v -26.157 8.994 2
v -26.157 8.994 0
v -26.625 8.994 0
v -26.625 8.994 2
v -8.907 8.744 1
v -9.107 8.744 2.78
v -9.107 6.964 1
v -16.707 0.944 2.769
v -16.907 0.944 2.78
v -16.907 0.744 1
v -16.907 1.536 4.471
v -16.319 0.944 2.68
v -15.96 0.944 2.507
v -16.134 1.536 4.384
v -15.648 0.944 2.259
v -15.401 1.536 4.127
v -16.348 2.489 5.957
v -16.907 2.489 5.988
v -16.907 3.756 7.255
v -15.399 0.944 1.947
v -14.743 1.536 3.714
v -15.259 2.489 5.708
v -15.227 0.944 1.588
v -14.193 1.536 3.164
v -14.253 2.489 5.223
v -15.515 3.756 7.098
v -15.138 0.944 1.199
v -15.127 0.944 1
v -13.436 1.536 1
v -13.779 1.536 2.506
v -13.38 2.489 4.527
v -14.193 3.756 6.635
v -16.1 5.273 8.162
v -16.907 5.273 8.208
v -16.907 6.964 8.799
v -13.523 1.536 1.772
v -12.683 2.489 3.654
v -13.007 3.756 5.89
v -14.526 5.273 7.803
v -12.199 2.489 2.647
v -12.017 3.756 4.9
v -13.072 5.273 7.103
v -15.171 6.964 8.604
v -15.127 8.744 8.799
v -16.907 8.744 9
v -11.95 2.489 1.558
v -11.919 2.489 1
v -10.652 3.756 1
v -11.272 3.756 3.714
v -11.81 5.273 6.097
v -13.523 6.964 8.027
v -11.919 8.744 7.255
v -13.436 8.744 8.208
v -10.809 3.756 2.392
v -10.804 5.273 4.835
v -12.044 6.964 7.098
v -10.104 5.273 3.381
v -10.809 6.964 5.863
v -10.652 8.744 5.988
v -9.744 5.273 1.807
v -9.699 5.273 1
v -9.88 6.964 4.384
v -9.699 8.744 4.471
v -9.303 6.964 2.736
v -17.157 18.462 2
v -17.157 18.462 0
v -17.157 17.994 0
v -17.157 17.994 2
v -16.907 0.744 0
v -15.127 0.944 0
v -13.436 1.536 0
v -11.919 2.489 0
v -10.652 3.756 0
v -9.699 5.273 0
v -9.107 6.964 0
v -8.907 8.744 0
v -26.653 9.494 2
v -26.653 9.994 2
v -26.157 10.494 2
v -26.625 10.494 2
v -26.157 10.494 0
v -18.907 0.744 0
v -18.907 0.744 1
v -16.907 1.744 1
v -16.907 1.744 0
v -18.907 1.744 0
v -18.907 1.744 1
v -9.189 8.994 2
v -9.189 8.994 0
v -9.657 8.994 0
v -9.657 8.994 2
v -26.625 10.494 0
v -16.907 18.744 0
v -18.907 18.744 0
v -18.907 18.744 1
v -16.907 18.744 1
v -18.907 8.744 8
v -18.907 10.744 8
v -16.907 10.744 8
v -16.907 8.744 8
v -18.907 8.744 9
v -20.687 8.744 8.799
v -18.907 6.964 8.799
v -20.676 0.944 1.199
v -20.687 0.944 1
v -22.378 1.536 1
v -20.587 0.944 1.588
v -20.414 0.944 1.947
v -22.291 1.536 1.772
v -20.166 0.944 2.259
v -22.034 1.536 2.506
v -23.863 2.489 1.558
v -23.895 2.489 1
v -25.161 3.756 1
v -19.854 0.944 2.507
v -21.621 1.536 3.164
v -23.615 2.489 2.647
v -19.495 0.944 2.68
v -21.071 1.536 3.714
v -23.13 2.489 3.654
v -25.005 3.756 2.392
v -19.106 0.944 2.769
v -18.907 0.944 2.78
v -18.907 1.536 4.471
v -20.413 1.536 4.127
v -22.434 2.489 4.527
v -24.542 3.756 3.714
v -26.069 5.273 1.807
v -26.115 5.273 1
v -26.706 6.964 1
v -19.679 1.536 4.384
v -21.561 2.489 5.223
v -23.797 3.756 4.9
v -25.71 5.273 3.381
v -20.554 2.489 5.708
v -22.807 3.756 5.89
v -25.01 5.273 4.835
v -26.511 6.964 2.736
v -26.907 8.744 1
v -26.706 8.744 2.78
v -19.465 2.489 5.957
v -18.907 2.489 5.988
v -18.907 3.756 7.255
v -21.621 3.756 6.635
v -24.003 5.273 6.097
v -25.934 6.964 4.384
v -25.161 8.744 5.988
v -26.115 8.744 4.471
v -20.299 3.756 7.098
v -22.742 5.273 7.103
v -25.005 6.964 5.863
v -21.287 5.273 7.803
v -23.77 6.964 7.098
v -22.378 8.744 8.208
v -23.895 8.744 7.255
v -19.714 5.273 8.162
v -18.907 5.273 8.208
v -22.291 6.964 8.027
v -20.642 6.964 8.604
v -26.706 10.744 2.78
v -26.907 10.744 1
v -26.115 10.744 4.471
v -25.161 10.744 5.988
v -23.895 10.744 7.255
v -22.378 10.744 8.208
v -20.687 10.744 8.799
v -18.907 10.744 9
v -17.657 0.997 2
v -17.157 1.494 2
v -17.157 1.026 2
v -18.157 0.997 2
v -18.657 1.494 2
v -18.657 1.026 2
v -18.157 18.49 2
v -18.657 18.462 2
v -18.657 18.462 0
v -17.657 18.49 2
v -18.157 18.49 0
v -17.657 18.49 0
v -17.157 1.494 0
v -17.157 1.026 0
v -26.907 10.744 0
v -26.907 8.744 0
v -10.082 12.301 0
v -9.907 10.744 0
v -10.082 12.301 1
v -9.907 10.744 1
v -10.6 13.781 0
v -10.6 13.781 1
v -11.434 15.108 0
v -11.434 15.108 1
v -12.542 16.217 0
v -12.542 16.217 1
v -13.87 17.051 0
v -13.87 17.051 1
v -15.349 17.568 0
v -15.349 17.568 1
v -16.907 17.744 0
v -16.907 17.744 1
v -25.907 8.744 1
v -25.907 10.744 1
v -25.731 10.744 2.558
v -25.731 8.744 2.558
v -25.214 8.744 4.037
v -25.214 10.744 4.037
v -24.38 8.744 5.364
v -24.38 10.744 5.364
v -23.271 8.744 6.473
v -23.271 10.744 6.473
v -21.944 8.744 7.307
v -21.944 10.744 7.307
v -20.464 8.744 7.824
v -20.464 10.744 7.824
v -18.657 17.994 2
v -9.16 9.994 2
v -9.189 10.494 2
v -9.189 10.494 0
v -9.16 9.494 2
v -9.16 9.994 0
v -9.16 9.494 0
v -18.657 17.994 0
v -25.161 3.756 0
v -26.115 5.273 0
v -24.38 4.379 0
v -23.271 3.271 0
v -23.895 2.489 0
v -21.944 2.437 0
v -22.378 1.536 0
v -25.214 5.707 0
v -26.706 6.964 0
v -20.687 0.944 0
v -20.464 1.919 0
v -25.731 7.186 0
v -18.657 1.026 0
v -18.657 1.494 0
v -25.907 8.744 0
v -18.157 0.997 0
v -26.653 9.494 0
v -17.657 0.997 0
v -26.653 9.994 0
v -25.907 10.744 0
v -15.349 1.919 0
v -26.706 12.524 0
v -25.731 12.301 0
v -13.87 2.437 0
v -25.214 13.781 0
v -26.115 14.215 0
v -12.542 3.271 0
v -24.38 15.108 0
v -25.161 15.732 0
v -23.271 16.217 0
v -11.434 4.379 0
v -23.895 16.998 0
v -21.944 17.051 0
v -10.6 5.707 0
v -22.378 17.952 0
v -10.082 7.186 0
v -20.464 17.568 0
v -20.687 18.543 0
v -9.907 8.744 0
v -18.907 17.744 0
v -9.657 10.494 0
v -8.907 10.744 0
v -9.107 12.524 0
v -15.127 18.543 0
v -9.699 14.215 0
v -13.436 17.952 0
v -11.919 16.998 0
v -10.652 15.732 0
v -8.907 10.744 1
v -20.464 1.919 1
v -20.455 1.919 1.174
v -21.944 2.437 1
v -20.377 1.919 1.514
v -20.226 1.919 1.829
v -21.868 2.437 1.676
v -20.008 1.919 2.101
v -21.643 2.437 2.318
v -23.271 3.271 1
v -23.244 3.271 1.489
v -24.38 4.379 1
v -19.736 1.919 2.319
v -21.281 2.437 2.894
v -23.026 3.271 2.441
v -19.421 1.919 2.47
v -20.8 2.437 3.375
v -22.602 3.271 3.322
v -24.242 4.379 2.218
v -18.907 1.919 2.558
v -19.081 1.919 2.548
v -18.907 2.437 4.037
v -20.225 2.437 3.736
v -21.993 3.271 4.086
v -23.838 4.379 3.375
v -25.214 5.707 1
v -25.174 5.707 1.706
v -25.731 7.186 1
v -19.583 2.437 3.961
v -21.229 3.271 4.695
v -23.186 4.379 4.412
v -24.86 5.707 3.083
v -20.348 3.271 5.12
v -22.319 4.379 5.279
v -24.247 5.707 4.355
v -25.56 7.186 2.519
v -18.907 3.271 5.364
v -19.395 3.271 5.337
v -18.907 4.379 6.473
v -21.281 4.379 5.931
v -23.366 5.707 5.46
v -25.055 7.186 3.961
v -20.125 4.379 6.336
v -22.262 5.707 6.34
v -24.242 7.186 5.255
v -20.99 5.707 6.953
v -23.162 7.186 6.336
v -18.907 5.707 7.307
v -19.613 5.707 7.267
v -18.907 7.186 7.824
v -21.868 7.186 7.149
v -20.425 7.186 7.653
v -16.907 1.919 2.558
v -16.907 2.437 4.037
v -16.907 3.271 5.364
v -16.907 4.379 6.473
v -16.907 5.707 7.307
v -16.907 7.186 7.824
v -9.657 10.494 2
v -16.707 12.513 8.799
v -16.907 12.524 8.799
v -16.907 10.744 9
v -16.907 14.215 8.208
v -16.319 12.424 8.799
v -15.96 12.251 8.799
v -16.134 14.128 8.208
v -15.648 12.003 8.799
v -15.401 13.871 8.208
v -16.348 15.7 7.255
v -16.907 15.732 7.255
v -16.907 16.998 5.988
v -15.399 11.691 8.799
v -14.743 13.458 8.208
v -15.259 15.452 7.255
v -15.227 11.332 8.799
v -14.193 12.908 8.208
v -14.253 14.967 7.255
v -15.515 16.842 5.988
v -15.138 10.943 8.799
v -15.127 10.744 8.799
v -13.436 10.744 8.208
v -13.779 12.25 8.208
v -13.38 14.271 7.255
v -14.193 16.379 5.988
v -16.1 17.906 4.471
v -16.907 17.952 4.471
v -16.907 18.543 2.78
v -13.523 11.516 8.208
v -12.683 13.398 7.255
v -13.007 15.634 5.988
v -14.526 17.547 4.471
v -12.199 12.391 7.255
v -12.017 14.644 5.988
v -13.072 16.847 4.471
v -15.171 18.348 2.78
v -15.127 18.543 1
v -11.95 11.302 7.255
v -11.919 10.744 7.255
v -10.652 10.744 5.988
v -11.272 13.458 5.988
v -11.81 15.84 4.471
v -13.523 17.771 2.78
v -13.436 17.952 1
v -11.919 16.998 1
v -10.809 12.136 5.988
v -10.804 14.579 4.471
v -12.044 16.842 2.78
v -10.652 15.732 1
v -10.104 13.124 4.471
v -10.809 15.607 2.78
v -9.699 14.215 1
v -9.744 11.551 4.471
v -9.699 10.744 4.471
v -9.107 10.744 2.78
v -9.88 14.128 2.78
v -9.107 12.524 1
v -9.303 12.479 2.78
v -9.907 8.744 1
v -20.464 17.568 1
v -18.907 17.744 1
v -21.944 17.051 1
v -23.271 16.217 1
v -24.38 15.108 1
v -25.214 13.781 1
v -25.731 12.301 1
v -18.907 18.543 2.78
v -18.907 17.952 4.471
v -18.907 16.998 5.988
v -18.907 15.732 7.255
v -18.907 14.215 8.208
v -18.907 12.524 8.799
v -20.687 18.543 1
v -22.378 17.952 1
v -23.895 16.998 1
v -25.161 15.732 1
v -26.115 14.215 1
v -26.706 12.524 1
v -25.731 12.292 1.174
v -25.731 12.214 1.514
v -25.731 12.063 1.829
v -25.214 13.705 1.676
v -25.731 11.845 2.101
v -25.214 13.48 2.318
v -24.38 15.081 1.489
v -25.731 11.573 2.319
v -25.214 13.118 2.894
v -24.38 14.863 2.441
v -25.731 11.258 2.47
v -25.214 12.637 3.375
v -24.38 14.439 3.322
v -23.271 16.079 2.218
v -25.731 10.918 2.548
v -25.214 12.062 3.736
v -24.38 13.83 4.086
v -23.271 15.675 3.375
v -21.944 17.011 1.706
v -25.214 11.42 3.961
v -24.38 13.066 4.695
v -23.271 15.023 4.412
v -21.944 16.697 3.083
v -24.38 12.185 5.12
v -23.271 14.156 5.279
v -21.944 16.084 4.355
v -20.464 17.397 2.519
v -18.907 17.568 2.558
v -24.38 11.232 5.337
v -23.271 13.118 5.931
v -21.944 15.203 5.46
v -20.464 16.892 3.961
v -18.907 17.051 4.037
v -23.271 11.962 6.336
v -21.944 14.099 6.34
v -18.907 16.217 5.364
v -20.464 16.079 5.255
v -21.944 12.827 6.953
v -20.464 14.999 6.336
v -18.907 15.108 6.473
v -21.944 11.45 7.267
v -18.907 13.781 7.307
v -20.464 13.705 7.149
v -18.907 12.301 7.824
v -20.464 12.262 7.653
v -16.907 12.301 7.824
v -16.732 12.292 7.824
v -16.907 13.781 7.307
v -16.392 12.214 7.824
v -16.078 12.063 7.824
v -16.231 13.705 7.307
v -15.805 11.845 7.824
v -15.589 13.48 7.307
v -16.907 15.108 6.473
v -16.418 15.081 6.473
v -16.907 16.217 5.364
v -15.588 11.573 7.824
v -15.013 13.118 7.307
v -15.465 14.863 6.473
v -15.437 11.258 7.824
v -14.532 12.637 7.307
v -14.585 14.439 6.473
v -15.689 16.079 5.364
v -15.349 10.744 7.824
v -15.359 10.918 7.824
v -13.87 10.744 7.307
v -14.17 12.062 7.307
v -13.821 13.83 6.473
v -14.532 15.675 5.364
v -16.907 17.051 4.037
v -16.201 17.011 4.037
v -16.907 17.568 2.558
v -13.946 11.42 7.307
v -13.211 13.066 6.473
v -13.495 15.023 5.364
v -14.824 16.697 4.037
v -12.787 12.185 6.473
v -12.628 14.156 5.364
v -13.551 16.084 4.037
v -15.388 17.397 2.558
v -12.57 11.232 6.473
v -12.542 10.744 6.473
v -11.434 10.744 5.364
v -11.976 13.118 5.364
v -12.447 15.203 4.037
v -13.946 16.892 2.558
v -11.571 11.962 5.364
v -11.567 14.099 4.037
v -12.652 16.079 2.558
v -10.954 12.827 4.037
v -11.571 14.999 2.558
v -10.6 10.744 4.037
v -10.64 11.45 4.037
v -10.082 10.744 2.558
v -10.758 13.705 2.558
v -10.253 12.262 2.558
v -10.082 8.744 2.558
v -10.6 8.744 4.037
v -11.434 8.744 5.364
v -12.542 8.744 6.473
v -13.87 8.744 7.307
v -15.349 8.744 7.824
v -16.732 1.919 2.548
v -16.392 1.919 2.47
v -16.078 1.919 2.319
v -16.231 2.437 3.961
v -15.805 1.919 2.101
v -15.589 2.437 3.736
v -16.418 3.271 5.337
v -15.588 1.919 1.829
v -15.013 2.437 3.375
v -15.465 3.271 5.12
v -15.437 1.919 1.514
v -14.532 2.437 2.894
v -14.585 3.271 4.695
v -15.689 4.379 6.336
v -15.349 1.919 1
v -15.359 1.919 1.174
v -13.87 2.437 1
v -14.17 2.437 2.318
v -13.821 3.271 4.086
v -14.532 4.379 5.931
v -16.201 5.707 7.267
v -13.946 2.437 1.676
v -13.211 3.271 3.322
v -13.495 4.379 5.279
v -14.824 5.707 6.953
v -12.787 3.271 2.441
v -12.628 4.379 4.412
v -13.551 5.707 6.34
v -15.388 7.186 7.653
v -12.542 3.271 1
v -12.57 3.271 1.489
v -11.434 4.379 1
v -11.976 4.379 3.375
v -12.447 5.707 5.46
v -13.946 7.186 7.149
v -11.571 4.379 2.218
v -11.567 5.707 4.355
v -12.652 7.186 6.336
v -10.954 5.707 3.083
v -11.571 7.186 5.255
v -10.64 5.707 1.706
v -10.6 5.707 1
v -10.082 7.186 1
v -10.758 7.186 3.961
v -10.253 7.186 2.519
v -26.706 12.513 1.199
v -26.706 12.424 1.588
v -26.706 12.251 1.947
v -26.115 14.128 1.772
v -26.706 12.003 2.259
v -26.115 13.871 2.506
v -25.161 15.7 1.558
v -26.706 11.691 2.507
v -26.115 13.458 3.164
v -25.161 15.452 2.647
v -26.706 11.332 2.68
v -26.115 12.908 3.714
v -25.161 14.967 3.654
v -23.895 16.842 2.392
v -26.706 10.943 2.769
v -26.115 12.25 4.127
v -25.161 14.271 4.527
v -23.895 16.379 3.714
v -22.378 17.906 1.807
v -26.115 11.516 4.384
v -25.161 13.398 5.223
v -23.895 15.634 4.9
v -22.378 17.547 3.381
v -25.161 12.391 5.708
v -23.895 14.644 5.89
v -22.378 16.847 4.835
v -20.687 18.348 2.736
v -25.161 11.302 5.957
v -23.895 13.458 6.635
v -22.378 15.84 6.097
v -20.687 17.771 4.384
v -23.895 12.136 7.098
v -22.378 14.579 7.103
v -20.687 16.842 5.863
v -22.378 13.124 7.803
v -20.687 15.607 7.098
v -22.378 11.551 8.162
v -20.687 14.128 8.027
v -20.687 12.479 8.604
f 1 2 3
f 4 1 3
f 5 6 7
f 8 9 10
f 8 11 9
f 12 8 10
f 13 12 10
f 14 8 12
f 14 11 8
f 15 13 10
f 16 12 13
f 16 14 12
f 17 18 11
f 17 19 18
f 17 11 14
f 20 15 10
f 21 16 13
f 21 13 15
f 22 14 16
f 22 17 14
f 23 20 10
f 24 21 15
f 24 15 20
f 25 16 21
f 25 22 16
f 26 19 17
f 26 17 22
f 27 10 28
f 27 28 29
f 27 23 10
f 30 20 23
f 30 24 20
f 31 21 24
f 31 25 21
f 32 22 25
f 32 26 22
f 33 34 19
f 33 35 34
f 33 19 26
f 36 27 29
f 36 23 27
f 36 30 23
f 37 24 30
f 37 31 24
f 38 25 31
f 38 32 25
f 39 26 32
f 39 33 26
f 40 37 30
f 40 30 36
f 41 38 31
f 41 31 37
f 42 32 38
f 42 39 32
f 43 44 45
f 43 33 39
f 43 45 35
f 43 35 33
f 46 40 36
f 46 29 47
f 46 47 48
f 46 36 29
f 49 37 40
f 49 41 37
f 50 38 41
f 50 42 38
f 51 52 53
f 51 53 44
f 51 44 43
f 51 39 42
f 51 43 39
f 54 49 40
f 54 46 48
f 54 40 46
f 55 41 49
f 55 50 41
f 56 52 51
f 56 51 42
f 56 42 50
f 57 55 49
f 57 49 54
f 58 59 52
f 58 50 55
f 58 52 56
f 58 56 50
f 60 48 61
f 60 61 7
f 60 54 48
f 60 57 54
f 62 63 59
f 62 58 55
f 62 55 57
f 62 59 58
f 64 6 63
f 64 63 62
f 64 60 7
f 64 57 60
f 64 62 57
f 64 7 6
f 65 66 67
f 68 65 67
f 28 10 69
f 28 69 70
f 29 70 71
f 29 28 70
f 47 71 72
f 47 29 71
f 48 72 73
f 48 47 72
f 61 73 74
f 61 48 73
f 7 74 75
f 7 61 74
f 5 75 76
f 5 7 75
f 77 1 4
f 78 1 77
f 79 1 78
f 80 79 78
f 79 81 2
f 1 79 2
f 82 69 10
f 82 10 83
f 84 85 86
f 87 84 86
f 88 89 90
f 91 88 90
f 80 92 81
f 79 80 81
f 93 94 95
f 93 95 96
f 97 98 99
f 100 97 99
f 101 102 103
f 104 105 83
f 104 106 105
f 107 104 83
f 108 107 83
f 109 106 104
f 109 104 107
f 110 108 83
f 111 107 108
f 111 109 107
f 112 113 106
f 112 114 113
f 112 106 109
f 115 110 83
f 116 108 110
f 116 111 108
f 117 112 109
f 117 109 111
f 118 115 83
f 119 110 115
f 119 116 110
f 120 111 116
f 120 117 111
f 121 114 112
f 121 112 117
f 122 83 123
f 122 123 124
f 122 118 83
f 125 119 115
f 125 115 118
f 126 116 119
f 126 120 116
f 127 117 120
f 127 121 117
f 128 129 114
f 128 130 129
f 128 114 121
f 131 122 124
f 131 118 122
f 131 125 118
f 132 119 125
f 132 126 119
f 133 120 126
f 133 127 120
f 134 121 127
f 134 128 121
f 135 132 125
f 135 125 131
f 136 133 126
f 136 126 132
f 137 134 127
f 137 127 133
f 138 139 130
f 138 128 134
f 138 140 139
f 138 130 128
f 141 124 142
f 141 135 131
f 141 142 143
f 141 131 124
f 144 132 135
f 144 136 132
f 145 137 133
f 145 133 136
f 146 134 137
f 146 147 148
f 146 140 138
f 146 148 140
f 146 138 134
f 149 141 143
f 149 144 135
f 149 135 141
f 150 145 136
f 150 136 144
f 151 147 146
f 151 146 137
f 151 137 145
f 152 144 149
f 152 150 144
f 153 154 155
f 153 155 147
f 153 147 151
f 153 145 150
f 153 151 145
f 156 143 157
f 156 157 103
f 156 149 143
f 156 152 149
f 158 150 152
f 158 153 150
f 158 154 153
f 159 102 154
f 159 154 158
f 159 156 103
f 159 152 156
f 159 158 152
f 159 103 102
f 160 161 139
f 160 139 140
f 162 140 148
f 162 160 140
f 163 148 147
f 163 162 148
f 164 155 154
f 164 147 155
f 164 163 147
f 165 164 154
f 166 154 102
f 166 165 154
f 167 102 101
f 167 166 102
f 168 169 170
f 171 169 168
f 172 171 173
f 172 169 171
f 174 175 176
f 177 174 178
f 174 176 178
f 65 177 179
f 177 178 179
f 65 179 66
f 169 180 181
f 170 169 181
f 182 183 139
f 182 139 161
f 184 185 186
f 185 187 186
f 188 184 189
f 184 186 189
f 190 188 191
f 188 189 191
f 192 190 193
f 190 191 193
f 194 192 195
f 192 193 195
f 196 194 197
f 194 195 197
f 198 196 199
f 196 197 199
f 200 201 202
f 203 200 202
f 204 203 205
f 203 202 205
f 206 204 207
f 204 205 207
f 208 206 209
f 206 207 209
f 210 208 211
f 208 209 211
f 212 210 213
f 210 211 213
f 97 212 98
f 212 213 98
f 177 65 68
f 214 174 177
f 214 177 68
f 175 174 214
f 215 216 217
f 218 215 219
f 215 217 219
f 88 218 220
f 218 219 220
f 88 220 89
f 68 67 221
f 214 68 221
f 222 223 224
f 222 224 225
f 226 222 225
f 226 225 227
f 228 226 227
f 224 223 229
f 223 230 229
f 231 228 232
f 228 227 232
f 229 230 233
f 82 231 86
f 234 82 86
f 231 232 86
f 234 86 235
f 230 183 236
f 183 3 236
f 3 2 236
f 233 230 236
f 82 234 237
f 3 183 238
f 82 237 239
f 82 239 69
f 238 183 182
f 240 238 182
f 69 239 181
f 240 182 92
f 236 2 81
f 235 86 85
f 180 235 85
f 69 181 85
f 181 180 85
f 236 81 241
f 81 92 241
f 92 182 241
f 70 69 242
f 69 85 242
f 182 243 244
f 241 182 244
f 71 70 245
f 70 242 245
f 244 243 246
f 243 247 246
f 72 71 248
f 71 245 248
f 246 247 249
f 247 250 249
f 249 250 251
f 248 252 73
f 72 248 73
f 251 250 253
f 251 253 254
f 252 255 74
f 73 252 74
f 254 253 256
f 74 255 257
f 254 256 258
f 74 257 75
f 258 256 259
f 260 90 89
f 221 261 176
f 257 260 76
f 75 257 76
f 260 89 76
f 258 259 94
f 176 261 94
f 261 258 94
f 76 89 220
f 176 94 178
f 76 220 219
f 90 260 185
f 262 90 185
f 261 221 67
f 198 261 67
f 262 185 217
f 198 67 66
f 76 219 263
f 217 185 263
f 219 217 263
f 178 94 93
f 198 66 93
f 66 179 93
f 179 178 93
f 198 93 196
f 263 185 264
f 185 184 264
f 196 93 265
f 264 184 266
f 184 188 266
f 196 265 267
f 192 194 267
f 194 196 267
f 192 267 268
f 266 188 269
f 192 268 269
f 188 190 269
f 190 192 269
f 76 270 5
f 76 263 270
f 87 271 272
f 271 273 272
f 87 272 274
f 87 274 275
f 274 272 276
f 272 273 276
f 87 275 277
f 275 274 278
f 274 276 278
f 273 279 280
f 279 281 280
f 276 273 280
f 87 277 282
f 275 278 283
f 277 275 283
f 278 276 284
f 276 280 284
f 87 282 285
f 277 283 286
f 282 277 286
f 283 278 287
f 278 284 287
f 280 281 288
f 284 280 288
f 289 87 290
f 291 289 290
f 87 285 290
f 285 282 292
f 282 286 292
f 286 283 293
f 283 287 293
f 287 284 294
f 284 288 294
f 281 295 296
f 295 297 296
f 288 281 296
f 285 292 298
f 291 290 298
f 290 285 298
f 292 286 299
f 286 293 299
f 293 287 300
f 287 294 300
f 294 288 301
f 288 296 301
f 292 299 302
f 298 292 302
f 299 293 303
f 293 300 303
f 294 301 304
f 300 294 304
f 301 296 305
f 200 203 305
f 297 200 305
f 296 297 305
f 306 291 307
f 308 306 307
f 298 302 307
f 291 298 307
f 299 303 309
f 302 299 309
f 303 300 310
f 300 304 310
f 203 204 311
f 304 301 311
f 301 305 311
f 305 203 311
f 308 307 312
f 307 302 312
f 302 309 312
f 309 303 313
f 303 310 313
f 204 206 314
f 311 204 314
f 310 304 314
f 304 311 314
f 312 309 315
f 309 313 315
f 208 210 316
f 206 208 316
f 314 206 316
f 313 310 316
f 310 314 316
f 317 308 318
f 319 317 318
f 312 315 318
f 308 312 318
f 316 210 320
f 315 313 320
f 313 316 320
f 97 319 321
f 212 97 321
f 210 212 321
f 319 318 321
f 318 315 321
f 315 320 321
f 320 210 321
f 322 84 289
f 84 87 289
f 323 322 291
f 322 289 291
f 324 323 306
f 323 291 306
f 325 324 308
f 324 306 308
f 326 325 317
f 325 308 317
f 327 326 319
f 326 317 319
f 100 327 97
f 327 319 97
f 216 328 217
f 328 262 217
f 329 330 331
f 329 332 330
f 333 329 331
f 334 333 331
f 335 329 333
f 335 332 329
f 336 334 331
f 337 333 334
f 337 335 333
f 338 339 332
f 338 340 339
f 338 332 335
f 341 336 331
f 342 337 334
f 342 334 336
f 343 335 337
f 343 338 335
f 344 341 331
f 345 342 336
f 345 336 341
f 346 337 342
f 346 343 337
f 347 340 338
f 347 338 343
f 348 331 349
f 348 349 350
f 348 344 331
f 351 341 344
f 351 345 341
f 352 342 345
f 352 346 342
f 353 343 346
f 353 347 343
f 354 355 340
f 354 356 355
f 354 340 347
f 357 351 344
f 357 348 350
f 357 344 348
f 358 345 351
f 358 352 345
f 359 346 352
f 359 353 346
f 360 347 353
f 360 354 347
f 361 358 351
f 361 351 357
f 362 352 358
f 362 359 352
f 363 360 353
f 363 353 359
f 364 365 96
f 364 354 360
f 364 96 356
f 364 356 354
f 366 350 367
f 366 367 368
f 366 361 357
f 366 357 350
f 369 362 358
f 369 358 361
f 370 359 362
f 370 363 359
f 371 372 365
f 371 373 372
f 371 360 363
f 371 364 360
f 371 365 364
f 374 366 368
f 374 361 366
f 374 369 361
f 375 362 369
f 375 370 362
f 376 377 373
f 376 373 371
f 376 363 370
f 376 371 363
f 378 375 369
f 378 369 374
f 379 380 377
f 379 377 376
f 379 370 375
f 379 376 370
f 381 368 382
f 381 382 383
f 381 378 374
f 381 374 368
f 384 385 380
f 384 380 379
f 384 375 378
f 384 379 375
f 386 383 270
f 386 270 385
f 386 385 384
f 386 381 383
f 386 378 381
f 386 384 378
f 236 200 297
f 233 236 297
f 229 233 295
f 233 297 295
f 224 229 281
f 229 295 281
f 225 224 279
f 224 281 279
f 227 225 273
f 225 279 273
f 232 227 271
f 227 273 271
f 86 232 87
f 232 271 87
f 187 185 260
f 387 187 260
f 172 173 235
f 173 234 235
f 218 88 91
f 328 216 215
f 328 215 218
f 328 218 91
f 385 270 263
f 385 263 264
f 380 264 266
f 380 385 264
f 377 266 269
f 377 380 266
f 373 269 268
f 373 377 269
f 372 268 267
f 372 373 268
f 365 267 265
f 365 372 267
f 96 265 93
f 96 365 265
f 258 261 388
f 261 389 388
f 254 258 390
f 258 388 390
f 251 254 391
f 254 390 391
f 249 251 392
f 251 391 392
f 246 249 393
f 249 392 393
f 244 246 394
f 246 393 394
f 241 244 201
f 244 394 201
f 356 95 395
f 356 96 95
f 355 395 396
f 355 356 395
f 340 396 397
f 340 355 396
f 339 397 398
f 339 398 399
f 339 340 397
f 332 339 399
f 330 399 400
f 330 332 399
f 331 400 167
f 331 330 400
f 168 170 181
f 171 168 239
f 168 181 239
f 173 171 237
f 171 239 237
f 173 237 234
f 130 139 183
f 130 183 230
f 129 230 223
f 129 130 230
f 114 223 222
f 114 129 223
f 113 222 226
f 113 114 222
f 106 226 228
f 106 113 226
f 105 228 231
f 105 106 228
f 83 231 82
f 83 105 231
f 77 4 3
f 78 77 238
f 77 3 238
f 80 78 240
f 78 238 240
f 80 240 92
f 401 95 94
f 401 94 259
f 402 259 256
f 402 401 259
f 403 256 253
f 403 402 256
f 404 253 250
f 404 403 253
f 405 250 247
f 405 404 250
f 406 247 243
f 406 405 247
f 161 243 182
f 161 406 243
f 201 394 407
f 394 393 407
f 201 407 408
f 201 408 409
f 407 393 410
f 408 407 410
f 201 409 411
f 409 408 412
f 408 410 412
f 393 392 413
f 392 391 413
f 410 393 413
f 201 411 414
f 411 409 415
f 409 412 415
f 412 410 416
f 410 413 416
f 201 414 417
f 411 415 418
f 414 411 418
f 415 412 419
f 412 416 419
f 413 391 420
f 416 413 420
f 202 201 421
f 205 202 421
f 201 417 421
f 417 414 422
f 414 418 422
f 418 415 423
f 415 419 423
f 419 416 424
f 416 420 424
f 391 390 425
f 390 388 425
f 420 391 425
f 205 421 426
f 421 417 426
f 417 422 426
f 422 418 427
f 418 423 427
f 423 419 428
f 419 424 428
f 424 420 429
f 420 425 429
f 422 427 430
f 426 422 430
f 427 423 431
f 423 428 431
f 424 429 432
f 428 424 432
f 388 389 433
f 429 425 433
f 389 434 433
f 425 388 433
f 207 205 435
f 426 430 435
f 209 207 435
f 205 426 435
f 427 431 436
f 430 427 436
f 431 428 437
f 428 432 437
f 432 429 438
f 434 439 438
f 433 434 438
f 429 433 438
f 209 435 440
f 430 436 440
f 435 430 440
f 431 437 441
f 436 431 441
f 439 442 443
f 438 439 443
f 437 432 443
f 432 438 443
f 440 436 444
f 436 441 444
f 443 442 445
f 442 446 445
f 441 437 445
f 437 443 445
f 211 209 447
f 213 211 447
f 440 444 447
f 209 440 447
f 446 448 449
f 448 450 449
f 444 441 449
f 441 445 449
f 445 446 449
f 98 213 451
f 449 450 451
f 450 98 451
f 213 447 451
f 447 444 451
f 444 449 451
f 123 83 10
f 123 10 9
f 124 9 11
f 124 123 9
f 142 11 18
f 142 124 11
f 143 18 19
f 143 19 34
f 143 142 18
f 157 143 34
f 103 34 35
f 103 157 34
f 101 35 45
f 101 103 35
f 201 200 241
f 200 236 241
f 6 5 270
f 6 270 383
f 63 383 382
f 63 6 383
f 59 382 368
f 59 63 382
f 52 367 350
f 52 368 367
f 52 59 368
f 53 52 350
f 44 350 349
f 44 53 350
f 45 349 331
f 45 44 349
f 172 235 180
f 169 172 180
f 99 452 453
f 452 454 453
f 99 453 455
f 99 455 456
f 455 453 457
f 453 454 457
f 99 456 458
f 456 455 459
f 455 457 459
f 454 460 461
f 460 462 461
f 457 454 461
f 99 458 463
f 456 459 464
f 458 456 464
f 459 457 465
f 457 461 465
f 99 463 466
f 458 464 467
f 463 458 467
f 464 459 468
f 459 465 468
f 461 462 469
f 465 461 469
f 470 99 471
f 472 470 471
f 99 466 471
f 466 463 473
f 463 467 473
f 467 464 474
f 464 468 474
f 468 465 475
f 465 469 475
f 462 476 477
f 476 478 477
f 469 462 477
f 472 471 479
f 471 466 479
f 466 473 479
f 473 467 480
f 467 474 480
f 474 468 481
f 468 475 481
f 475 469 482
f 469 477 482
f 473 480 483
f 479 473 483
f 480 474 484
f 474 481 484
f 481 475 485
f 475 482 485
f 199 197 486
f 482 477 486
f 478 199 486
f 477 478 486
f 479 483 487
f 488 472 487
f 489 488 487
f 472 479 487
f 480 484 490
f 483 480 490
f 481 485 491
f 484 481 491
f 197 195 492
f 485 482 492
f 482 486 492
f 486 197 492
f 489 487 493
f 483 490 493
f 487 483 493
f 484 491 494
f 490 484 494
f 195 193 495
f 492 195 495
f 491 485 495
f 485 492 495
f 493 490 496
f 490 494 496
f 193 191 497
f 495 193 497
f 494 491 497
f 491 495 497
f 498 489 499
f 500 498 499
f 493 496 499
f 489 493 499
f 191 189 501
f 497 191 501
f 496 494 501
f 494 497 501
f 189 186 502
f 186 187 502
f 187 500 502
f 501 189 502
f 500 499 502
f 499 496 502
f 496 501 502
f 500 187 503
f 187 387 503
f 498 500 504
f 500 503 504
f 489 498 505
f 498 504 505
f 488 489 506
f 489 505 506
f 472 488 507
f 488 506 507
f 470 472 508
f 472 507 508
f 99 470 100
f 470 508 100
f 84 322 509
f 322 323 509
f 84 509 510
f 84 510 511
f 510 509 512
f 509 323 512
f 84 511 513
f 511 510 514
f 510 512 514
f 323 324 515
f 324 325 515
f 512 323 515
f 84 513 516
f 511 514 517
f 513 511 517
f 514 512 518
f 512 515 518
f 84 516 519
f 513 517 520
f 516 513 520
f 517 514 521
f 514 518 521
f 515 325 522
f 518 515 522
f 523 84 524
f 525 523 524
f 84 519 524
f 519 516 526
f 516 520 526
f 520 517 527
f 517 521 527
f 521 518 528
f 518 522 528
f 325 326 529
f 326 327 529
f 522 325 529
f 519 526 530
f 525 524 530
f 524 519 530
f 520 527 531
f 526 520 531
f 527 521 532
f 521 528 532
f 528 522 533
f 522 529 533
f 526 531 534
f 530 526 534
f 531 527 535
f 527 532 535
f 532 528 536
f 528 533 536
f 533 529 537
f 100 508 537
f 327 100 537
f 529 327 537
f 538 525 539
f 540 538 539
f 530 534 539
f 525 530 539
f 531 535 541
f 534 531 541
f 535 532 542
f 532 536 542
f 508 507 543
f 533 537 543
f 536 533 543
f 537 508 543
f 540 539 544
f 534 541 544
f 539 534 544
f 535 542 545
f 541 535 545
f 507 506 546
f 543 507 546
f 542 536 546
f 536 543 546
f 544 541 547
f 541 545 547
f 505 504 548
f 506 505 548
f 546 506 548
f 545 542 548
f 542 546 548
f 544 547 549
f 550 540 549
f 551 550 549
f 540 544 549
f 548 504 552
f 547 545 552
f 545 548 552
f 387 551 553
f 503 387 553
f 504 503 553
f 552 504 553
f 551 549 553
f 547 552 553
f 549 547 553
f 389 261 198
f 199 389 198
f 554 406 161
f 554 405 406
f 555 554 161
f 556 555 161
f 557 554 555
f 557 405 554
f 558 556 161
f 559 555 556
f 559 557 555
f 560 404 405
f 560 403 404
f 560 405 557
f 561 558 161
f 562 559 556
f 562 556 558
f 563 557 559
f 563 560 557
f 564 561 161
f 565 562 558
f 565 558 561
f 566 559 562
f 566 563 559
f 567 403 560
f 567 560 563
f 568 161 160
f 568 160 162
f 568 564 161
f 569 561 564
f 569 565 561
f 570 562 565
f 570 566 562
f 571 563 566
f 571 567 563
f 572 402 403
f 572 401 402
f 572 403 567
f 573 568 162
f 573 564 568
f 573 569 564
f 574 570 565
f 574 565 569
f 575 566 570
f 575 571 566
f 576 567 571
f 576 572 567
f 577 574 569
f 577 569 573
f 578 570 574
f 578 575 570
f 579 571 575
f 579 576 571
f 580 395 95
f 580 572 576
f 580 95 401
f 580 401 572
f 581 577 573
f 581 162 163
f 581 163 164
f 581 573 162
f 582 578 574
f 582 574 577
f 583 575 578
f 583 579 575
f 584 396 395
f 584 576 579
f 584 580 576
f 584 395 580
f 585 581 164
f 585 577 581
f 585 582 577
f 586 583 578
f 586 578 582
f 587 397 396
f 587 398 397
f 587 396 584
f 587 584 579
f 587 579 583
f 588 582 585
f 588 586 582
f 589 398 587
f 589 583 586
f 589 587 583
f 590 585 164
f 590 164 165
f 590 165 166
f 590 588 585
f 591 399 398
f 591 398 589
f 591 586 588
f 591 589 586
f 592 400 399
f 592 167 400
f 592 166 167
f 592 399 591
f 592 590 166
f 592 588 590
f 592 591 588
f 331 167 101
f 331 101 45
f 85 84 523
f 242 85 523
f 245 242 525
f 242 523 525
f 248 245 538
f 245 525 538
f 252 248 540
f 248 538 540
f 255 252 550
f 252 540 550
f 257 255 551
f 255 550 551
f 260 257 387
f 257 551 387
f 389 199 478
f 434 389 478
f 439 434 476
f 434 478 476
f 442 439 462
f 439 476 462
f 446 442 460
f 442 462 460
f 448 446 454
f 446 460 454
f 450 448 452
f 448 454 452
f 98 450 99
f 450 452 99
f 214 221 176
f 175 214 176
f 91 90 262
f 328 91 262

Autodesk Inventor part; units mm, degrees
ref_plane "YZ Plane" through (0, 0, 0) normal (1, 0, 0) x (0, 1, 0)
ref_plane "XZ Plane" through (0, 0, 0) normal (0, 1, 0) x (-1, 0, 0)
ref_plane "XY Plane" through (0, 0, 0) normal (0, 0, 1) x (1, 0, 0)
sketch "Sketch1" plane through (0, 0, 0) normal (0, 0, 1) x (1, 0, 0)
  line L0 (-26.9068, 18.7438) -> (-8.9068, 18.7438)
  line L1 (-8.9068, 18.7438) -> (-8.9068, 0.7438)
  line L2 (-8.9068, 0.7438) -> (-26.9068, 0.7438)
  line L3 (-26.9068, 0.7438) -> (-26.9068, 18.7438)
  point P0 (0, 0)
  dimension "d5" = 18
  dimension "d6" = 18
extrude "Extrusion1" add sketch "Sketch1" along normal blind 9
sketch "Sketch2" plane through (0, 0, 0) normal (0, 0, -1) x (-1, 0, 0)
  line L0 (8.9068, 18.7438) -> (26.9068, 18.7438) projected
  arc A0 (26.9068, 10.7438) -> (18.9068, 18.7438) centre (18.9068, 10.7438) ccw projected
  arc A1 (25.9068, 10.7438) -> (18.9068, 17.7438) centre (18.9068, 10.7438) ccw projected
  line L1 (9.9068, 17.7438) -> (25.9068, 17.7438) projected
  arc A2 (16.9068, 17.7438) -> (9.9068, 10.7438) centre (16.9068, 10.7438) ccw projected
  arc A3 (16.9068, 18.7438) -> (8.9068, 10.7438) centre (16.9068, 10.7438) ccw projected
  line L2 (8.9068, 0.7438) -> (8.9068, 18.7438) projected
  line L3 (9.9068, 1.7438) -> (9.9068, 17.7438) projected
  arc A4 (8.9068, 8.7438) -> (16.9068, 0.7438) centre (16.9068, 8.7438) ccw projected
  arc A5 (9.9068, 8.7438) -> (16.9068, 1.7438) centre (16.9068, 8.7438) ccw projected
  line L4 (26.9068, 0.7438) -> (8.9068, 0.7438) projected
  line L5 (25.9068, 1.7438) -> (9.9068, 1.7438) projected
  arc A6 (18.9068, 0.7438) -> (26.9068, 8.7438) centre (18.9068, 8.7438) ccw projected
  arc A7 (18.9068, 1.7438) -> (25.9068, 8.7438) centre (18.9068, 8.7438) ccw projected
  line L6 (25.9068, 17.7438) -> (25.9068, 1.7438) projected
  line L7 (26.9068, 18.7438) -> (26.9068, 0.7438) projected
  line L8 (26.6568, 10.4938) -> (26.1568, 10.4938)
  line L9 (26.1568, 10.4938) -> (26.1568, 8.9938)
  line L10 (26.1568, 8.9938) -> (26.6568, 8.9938)
  line L11 (26.6568, 8.9938) -> (26.6568, 10.4938)
  circle A8 centre (17.9068, 9.7438) radius 8.75
  line L12 (17.1568, 17.9938) -> (18.6568, 17.9938)
  line L13 (18.6568, 17.9938) -> (18.6568, 18.4938)
  line L14 (18.6568, 18.4938) -> (17.1568, 18.4938)
  line L15 (17.1568, 18.4938) -> (17.1568, 17.9938)
  line L16 (9.6568, 8.9938) -> (9.6568, 10.4938)
  line L17 (9.6568, 10.4938) -> (9.1568, 10.4938)
  line L18 (9.1568, 10.4938) -> (9.1568, 8.9938)
  line L19 (9.1568, 8.9938) -> (9.6568, 8.9938)
  line L20 (18.6568, 1.4938) -> (17.1568, 1.4938)
  line L21 (17.1568, 1.4938) -> (17.1568, 0.9938)
  line L22 (17.1568, 0.9938) -> (18.6568, 0.9938)
  line L23 (18.6568, 0.9938) -> (18.6568, 1.4938)
  point P0 (0, 0)
  point P1 (18.6568, 18.4616)
  point P2 (17.1568, 18.4616)
  point P3 (9.189, 10.4938)
  point P4 (9.189, 8.9938)
  point P5 (17.1568, 1.026)
  point P6 (18.6568, 1.026)
  point P7 (26.6245, 8.9938)
  point P8 (26.6245, 10.4938)
  dimension "d12" = 1.5
  dimension "d13" = 0.5
  dimension "d14" = 0.25
  dimension "d16" = 0.25
  dimension "d18" = 8
  dimension "d19" = 17.5
  dimension "d22" = 360
fillet "Fillet3" radius 8 8 edges at (-8.9068, 18.7438, 4.5) (-17.9068, 18.7438, 9) (-26.9068, 18.7438, 4.5) (-26.9068, 9.7438, 9) (-8.9068, 9.7438, 9) (-8.9068, 0.7438, 4.5) (-17.9068, 0.7438, 9) (-26.9068, 0.7438, 4.5)
shell "Shell2" thickness 1 removed faces 1 at (-17.5734, 12.7438, 0)
extrude "Extrusion4" cut sketch "Sketch2" against normal blind 2 contours A8 L13 L12 L15 | L17 L16 L19 A8 | A8 L10 L9 L8 | L21 L20 L23 A8
properties part number "McCrea_horny_kos_walle_MIR2" material "Silver"
